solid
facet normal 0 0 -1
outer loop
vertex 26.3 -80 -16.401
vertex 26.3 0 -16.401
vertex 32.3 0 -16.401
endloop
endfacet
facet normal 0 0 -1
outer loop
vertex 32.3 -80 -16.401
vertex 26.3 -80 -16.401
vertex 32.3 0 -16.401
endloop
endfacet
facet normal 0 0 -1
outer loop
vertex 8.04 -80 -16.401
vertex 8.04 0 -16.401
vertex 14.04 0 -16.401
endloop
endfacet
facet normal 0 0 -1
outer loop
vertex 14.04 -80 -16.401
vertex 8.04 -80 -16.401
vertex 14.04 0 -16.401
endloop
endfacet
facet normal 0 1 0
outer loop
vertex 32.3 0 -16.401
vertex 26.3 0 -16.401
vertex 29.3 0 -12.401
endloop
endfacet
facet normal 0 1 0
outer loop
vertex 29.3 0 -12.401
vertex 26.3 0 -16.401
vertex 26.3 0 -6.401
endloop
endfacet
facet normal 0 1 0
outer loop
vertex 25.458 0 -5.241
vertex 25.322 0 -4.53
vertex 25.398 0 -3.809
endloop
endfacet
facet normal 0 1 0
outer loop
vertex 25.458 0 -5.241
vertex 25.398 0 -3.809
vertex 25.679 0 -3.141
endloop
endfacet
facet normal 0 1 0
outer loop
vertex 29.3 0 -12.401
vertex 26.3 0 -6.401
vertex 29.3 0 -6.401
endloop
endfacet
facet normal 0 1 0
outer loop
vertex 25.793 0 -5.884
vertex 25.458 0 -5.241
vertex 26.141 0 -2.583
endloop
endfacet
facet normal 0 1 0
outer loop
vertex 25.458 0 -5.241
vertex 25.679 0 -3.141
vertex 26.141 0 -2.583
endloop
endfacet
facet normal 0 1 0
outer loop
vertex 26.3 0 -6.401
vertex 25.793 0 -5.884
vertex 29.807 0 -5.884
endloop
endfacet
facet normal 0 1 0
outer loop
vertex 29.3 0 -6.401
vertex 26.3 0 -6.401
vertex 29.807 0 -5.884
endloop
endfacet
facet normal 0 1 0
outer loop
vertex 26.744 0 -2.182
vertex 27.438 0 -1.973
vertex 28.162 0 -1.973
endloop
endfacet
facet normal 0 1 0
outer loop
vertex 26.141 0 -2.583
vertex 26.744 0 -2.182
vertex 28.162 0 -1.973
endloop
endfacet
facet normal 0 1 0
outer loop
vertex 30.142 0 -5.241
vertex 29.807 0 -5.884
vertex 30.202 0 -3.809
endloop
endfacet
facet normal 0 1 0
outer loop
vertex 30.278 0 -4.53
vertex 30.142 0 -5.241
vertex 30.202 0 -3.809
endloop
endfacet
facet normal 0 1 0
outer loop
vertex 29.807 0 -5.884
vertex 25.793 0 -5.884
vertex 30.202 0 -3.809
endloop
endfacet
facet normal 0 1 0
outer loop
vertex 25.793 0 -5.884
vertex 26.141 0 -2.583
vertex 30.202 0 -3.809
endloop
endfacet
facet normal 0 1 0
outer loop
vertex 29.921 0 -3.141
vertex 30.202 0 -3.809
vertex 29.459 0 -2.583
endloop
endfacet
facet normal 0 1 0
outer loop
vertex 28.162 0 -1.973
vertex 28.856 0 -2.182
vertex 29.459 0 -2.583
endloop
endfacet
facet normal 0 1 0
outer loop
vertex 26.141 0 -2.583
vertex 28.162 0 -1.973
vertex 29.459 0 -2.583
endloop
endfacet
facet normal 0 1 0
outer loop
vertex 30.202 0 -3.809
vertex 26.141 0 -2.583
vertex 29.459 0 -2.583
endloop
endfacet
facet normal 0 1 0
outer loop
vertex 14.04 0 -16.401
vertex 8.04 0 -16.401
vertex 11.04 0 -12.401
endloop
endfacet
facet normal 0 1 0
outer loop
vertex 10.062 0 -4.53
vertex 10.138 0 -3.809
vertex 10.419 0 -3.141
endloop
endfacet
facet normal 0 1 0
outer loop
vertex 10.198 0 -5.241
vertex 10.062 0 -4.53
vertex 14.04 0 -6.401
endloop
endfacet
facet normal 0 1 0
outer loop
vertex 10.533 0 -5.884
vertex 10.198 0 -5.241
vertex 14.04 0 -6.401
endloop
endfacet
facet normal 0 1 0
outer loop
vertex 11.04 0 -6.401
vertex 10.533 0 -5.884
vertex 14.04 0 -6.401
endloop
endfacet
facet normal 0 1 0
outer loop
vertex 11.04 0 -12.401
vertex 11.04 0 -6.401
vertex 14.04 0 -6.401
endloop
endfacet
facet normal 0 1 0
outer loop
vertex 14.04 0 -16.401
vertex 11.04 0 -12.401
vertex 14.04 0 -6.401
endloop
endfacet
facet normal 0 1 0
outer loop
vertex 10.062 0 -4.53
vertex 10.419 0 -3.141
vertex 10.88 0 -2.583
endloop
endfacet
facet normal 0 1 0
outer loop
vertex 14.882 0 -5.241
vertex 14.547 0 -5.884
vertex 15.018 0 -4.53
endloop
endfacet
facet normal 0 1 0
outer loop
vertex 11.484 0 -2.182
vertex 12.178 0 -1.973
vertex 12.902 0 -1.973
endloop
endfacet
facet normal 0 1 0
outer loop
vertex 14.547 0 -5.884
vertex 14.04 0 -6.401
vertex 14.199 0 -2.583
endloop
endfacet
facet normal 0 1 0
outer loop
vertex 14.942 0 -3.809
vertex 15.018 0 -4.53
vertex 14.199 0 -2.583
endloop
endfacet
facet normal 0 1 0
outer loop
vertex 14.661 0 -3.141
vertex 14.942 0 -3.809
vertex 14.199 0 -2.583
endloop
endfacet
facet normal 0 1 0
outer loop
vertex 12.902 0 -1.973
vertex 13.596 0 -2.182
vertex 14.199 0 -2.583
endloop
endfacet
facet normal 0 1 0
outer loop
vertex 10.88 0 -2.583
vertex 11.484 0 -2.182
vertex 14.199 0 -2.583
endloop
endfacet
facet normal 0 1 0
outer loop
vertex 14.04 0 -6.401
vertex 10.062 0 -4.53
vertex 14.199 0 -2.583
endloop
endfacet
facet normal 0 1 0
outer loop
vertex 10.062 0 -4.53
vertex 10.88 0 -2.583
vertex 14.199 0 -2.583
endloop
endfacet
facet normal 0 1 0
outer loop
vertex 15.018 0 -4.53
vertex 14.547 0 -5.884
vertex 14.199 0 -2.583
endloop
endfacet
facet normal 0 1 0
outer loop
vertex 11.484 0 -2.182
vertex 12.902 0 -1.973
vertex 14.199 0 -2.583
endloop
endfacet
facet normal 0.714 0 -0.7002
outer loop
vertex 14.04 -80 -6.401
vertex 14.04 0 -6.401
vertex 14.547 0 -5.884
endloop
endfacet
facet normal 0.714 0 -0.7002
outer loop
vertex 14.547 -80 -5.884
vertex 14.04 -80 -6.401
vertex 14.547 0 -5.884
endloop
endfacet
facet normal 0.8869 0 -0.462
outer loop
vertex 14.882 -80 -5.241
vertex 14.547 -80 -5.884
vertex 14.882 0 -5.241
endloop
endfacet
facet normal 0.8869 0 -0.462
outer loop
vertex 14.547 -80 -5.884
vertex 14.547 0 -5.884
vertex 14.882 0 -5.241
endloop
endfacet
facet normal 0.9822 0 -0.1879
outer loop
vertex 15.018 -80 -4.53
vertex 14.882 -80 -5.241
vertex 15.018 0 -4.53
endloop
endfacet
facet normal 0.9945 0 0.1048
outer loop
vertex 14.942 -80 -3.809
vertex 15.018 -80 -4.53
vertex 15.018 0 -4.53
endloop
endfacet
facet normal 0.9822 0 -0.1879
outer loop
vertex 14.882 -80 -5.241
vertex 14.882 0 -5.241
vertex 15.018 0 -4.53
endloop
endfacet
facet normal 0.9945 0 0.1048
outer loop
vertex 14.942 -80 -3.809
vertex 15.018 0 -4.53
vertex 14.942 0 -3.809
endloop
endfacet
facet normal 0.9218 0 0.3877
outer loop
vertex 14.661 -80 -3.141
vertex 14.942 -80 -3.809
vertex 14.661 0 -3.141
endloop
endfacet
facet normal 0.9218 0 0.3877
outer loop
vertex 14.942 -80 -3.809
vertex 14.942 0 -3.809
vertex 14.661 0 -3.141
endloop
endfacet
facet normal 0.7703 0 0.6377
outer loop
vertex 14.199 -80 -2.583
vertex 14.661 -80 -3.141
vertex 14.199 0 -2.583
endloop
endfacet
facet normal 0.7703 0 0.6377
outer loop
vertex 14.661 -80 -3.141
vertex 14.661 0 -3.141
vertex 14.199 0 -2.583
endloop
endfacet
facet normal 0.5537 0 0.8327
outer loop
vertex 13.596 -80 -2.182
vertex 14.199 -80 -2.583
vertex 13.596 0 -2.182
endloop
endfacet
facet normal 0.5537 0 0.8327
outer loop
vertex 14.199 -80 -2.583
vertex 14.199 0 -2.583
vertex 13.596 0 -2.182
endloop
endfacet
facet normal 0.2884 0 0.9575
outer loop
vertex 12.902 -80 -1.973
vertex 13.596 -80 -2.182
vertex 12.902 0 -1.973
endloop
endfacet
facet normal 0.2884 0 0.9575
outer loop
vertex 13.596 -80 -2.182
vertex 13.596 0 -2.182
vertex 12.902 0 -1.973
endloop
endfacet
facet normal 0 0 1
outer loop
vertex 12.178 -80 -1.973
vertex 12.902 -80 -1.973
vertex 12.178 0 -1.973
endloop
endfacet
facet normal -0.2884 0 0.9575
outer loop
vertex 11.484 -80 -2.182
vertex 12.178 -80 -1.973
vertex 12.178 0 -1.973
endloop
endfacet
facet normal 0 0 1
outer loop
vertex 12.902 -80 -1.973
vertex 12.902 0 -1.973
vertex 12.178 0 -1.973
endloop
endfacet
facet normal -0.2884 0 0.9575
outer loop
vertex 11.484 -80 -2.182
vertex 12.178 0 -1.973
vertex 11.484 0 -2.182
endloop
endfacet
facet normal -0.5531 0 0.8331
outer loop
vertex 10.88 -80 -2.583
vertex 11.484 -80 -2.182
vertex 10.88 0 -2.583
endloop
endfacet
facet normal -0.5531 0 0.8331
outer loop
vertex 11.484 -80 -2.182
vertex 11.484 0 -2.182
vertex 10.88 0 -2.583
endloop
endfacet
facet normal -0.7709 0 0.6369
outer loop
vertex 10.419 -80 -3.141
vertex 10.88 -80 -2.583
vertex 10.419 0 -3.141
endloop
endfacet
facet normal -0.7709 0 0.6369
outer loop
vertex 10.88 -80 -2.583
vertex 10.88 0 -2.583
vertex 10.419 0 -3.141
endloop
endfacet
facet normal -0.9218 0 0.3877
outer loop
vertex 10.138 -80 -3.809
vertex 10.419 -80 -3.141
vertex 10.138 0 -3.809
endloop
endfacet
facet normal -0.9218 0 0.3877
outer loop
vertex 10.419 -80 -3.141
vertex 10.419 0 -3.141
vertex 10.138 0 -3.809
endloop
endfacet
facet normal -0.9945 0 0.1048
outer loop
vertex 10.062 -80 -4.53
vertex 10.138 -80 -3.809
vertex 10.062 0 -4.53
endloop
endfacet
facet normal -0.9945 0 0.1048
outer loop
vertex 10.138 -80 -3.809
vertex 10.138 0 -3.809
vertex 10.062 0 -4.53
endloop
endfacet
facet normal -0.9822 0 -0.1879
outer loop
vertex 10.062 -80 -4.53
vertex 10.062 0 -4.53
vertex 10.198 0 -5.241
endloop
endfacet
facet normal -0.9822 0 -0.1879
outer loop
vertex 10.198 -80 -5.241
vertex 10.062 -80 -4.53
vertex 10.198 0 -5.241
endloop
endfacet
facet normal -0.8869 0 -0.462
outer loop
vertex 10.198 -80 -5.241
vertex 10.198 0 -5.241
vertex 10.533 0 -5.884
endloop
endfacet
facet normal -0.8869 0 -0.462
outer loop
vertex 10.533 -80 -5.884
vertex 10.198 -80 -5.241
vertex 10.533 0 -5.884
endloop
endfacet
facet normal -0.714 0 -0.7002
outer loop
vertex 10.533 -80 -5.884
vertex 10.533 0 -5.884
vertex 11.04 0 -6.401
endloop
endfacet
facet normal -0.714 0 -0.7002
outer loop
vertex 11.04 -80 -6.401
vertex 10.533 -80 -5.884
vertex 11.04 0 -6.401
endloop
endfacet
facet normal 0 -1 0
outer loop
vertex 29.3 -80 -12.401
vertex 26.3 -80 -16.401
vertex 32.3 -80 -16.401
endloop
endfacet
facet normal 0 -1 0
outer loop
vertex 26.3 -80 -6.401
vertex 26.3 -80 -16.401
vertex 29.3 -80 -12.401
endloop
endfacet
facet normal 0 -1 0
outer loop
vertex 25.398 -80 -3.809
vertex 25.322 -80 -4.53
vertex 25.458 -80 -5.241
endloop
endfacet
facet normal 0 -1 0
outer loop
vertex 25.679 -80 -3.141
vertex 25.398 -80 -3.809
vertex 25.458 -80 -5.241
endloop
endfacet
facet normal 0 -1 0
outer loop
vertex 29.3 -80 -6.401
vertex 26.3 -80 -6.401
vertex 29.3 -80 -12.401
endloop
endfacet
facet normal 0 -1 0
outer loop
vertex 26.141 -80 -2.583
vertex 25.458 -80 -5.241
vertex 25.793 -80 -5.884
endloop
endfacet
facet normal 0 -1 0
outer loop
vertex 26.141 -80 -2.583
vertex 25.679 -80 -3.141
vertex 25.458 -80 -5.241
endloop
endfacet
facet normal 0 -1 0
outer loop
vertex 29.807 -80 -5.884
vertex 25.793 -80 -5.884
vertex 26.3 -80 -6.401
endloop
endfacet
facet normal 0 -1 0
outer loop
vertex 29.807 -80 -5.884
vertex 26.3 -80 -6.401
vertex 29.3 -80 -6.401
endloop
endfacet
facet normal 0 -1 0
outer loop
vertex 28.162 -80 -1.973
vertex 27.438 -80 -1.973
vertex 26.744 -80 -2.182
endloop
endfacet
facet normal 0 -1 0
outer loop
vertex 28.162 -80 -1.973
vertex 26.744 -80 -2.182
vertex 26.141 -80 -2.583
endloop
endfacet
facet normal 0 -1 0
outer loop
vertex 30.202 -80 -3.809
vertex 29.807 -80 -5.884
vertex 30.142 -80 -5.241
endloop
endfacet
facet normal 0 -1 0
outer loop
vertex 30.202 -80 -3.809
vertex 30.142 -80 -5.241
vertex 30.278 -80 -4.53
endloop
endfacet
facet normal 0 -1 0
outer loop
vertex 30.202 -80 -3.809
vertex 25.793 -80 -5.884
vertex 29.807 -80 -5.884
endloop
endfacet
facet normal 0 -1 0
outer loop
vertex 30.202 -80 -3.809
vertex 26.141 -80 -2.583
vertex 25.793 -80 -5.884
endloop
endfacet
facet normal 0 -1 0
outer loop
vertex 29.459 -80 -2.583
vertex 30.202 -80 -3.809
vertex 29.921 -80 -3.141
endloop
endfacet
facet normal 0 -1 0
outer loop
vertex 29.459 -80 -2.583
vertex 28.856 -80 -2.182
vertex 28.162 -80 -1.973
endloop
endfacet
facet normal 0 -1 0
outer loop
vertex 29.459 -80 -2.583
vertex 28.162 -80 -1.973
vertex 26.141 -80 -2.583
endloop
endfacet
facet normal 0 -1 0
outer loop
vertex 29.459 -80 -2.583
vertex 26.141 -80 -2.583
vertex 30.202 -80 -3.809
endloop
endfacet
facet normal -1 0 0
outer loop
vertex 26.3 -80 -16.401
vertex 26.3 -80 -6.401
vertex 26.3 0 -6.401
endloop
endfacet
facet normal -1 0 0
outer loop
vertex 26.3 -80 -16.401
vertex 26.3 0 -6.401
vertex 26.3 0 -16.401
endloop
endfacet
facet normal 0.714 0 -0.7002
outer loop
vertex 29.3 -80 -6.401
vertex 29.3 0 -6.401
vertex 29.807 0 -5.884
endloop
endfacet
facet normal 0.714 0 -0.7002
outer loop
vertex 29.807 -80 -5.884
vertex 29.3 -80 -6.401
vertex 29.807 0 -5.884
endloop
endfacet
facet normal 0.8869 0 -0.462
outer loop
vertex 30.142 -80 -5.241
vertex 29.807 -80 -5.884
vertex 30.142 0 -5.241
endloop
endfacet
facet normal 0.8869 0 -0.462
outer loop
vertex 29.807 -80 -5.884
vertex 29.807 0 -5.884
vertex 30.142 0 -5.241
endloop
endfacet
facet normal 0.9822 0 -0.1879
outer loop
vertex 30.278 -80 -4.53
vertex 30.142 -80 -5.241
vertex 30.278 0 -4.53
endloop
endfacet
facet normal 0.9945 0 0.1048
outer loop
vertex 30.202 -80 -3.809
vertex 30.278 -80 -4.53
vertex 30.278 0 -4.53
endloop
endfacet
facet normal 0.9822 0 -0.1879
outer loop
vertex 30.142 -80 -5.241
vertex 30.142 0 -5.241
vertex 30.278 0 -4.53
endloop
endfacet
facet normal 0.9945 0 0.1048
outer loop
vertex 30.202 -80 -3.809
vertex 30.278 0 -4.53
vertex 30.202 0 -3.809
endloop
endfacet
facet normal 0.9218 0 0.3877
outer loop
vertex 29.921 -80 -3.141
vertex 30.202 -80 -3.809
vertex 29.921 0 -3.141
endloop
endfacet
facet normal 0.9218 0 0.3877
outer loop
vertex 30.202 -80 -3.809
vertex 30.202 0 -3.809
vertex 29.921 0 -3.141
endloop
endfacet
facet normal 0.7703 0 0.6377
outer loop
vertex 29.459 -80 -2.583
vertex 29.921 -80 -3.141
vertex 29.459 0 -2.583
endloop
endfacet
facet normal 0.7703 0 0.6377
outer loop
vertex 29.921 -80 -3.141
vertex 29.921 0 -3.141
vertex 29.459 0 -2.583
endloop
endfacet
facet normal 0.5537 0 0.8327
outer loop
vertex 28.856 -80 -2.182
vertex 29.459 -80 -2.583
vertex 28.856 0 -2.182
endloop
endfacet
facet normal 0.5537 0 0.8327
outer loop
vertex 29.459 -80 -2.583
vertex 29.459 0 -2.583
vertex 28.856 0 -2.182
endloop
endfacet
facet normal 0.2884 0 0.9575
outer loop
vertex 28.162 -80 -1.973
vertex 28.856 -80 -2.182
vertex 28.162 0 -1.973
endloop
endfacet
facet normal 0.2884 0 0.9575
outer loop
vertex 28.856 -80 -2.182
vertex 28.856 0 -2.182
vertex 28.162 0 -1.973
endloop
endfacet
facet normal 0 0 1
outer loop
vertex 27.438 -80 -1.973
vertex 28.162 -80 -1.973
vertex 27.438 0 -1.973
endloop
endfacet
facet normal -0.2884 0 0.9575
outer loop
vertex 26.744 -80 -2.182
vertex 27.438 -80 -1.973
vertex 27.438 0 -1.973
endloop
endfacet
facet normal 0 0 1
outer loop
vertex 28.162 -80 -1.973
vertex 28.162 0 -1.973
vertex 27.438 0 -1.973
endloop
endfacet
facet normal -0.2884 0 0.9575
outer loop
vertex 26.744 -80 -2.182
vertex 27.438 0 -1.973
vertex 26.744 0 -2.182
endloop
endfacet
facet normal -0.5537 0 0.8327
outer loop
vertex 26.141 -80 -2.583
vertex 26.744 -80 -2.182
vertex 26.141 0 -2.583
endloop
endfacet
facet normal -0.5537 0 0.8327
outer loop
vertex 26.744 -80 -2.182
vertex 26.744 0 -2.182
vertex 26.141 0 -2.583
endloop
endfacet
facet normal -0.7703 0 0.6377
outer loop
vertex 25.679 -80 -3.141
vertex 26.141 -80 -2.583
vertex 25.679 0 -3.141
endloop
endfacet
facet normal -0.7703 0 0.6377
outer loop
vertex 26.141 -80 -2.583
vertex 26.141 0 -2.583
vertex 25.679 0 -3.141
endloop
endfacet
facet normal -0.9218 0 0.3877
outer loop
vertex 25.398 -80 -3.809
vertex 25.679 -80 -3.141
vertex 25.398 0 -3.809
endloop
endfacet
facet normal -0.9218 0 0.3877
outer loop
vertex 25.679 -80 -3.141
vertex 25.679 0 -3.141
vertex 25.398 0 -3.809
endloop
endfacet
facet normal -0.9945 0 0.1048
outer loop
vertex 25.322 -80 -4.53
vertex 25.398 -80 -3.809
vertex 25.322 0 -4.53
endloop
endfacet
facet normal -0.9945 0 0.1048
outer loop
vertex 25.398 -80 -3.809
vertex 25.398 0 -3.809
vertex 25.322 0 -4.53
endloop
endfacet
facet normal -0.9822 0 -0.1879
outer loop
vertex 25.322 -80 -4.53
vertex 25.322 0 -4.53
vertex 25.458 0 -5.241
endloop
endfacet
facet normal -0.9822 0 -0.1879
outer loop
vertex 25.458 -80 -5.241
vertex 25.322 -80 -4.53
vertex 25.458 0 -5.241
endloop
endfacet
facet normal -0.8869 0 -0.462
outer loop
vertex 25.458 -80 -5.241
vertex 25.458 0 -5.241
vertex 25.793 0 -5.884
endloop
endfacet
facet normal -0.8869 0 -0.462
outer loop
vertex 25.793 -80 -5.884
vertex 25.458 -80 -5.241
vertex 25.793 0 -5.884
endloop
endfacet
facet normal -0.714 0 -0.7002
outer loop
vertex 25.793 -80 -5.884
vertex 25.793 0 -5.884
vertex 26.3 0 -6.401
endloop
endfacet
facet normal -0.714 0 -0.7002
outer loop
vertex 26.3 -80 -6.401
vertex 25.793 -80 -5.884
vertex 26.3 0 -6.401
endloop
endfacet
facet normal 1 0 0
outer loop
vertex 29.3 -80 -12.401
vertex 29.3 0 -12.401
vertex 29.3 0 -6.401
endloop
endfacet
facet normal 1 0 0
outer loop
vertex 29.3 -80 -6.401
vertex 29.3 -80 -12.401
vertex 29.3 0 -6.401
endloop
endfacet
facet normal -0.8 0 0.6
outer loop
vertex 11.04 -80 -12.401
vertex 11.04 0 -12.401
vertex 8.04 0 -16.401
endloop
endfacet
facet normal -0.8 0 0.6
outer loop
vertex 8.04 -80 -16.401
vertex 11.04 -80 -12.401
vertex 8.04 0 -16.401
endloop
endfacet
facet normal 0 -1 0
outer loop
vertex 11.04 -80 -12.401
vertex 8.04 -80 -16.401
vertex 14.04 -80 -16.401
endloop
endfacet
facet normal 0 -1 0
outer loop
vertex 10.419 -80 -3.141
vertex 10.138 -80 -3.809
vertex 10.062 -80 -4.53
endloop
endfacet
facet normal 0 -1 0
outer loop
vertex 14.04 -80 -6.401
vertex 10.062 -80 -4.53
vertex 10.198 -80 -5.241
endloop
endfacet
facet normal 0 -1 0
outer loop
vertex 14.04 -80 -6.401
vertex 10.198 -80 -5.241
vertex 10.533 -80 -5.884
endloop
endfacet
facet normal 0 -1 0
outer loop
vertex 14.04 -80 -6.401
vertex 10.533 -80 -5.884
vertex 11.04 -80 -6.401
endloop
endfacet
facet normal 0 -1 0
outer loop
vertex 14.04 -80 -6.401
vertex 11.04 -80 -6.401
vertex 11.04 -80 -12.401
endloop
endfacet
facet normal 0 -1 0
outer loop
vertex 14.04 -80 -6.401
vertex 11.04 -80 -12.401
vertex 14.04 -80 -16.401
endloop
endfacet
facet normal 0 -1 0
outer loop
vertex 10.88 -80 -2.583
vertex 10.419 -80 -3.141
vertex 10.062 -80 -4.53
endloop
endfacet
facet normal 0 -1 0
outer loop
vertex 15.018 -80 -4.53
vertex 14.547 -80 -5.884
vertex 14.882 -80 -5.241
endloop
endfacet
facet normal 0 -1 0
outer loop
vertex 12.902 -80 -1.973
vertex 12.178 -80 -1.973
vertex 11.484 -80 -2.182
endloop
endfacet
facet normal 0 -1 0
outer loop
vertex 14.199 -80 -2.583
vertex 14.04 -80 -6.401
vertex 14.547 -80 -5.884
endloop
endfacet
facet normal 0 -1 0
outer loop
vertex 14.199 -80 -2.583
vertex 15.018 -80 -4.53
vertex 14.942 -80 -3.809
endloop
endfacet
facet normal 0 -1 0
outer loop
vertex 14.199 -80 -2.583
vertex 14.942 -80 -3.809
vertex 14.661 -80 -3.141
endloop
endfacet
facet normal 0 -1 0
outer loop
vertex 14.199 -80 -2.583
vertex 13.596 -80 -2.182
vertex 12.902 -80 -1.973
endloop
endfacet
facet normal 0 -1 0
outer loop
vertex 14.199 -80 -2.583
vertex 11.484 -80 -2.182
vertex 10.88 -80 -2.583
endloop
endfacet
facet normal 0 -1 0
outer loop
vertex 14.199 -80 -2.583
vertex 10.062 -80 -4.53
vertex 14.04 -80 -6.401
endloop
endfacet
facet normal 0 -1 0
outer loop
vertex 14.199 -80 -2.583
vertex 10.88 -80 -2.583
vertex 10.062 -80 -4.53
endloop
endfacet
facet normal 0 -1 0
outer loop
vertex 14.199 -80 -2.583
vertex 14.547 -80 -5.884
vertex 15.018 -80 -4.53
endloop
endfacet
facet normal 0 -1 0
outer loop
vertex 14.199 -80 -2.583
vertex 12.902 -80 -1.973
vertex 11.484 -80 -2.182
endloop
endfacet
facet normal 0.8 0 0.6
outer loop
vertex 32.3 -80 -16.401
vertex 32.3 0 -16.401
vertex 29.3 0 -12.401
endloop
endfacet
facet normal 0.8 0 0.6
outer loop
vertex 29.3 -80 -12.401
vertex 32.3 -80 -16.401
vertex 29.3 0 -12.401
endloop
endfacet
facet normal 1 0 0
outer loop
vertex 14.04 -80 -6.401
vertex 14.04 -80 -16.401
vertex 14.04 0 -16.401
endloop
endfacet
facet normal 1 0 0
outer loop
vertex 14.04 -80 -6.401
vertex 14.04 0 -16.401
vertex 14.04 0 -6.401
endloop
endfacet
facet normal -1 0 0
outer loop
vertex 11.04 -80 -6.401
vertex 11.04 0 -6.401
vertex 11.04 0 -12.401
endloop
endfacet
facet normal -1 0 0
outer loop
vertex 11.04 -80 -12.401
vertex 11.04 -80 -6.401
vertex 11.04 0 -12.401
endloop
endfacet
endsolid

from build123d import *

# Parameters (mm, degrees)
F1_DEPTH = 80


with BuildPart() as f1:
    # F0 (on Front) → F1 (new body)
    with BuildSketch(Plane.XZ):
        Polygon((14.039754, -16.401339), (14.039754, -12.401339), (11.039754, -12.401339), (8.039754, -16.401339), align=None)
        with BuildLine():
            ThreePointArc((29.299947, -6.401339), (27.799947, -1.946396), (26.299947, -6.401339))
            Line((26.299947, -6.401339), (26.299947, -12.401339))
            Line((26.299947, -12.401339), (29.299947, -12.401339))
            Line((29.299947, -12.401339), (29.299947, -6.401339))
        make_face()
        Polygon((29.299947, -12.401339), (26.299947, -12.401339), (26.299947, -16.401339), (32.299947, -16.401339), align=None)
        with BuildLine():
            Line((14.039754, -12.401339), (14.039754, -6.401339))
            ThreePointArc((14.039754, -6.401339), (12.539754, -1.946396), (11.039754, -6.401339))
            Line((11.039754, -6.401339), (11.039754, -12.401339))
            Line((11.039754, -12.401339), (14.039754, -12.401339))
        make_face()
    extrude(amount=F1_DEPTH)


solid = f1.part
